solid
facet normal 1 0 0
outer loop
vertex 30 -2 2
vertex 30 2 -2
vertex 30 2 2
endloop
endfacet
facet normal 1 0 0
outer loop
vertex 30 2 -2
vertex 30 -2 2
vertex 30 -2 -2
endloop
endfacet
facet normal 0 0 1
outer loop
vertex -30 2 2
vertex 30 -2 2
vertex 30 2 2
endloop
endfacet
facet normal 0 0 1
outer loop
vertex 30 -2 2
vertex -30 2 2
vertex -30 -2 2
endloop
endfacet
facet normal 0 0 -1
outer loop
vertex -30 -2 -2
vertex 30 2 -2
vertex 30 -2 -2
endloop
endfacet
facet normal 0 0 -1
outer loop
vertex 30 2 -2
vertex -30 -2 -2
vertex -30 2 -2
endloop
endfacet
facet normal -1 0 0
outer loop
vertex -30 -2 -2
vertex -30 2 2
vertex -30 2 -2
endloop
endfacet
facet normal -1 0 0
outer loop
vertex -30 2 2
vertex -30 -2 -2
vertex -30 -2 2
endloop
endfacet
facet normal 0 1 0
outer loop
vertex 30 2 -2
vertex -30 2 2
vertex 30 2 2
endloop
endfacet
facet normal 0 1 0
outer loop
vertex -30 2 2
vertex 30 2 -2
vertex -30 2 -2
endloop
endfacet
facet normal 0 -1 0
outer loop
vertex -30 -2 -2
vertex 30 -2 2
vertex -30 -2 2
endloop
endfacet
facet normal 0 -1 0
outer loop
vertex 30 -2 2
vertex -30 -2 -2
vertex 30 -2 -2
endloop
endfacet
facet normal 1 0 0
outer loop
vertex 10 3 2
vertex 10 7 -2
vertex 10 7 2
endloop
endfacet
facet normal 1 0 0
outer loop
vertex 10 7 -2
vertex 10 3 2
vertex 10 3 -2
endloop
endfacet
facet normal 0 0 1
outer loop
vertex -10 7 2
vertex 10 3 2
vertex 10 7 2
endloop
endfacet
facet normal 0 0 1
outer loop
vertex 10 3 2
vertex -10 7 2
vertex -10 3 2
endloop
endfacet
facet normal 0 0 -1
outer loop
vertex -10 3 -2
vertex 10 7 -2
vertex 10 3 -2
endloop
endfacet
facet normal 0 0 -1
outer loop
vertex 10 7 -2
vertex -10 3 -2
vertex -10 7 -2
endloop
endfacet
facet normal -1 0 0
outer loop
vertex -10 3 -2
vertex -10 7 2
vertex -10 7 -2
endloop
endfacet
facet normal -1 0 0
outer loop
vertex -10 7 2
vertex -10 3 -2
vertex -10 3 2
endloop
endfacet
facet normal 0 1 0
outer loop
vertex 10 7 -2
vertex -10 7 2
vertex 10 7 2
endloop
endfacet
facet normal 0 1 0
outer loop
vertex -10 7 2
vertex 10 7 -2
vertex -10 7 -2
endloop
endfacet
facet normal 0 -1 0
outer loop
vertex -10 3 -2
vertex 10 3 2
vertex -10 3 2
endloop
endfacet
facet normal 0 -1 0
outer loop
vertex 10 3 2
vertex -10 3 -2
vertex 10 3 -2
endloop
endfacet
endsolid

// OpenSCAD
$fn=60;
cube(size = [60,4,4], center = true);

translate([0,5,0])
cube(size = [20,4,4], center = true);
